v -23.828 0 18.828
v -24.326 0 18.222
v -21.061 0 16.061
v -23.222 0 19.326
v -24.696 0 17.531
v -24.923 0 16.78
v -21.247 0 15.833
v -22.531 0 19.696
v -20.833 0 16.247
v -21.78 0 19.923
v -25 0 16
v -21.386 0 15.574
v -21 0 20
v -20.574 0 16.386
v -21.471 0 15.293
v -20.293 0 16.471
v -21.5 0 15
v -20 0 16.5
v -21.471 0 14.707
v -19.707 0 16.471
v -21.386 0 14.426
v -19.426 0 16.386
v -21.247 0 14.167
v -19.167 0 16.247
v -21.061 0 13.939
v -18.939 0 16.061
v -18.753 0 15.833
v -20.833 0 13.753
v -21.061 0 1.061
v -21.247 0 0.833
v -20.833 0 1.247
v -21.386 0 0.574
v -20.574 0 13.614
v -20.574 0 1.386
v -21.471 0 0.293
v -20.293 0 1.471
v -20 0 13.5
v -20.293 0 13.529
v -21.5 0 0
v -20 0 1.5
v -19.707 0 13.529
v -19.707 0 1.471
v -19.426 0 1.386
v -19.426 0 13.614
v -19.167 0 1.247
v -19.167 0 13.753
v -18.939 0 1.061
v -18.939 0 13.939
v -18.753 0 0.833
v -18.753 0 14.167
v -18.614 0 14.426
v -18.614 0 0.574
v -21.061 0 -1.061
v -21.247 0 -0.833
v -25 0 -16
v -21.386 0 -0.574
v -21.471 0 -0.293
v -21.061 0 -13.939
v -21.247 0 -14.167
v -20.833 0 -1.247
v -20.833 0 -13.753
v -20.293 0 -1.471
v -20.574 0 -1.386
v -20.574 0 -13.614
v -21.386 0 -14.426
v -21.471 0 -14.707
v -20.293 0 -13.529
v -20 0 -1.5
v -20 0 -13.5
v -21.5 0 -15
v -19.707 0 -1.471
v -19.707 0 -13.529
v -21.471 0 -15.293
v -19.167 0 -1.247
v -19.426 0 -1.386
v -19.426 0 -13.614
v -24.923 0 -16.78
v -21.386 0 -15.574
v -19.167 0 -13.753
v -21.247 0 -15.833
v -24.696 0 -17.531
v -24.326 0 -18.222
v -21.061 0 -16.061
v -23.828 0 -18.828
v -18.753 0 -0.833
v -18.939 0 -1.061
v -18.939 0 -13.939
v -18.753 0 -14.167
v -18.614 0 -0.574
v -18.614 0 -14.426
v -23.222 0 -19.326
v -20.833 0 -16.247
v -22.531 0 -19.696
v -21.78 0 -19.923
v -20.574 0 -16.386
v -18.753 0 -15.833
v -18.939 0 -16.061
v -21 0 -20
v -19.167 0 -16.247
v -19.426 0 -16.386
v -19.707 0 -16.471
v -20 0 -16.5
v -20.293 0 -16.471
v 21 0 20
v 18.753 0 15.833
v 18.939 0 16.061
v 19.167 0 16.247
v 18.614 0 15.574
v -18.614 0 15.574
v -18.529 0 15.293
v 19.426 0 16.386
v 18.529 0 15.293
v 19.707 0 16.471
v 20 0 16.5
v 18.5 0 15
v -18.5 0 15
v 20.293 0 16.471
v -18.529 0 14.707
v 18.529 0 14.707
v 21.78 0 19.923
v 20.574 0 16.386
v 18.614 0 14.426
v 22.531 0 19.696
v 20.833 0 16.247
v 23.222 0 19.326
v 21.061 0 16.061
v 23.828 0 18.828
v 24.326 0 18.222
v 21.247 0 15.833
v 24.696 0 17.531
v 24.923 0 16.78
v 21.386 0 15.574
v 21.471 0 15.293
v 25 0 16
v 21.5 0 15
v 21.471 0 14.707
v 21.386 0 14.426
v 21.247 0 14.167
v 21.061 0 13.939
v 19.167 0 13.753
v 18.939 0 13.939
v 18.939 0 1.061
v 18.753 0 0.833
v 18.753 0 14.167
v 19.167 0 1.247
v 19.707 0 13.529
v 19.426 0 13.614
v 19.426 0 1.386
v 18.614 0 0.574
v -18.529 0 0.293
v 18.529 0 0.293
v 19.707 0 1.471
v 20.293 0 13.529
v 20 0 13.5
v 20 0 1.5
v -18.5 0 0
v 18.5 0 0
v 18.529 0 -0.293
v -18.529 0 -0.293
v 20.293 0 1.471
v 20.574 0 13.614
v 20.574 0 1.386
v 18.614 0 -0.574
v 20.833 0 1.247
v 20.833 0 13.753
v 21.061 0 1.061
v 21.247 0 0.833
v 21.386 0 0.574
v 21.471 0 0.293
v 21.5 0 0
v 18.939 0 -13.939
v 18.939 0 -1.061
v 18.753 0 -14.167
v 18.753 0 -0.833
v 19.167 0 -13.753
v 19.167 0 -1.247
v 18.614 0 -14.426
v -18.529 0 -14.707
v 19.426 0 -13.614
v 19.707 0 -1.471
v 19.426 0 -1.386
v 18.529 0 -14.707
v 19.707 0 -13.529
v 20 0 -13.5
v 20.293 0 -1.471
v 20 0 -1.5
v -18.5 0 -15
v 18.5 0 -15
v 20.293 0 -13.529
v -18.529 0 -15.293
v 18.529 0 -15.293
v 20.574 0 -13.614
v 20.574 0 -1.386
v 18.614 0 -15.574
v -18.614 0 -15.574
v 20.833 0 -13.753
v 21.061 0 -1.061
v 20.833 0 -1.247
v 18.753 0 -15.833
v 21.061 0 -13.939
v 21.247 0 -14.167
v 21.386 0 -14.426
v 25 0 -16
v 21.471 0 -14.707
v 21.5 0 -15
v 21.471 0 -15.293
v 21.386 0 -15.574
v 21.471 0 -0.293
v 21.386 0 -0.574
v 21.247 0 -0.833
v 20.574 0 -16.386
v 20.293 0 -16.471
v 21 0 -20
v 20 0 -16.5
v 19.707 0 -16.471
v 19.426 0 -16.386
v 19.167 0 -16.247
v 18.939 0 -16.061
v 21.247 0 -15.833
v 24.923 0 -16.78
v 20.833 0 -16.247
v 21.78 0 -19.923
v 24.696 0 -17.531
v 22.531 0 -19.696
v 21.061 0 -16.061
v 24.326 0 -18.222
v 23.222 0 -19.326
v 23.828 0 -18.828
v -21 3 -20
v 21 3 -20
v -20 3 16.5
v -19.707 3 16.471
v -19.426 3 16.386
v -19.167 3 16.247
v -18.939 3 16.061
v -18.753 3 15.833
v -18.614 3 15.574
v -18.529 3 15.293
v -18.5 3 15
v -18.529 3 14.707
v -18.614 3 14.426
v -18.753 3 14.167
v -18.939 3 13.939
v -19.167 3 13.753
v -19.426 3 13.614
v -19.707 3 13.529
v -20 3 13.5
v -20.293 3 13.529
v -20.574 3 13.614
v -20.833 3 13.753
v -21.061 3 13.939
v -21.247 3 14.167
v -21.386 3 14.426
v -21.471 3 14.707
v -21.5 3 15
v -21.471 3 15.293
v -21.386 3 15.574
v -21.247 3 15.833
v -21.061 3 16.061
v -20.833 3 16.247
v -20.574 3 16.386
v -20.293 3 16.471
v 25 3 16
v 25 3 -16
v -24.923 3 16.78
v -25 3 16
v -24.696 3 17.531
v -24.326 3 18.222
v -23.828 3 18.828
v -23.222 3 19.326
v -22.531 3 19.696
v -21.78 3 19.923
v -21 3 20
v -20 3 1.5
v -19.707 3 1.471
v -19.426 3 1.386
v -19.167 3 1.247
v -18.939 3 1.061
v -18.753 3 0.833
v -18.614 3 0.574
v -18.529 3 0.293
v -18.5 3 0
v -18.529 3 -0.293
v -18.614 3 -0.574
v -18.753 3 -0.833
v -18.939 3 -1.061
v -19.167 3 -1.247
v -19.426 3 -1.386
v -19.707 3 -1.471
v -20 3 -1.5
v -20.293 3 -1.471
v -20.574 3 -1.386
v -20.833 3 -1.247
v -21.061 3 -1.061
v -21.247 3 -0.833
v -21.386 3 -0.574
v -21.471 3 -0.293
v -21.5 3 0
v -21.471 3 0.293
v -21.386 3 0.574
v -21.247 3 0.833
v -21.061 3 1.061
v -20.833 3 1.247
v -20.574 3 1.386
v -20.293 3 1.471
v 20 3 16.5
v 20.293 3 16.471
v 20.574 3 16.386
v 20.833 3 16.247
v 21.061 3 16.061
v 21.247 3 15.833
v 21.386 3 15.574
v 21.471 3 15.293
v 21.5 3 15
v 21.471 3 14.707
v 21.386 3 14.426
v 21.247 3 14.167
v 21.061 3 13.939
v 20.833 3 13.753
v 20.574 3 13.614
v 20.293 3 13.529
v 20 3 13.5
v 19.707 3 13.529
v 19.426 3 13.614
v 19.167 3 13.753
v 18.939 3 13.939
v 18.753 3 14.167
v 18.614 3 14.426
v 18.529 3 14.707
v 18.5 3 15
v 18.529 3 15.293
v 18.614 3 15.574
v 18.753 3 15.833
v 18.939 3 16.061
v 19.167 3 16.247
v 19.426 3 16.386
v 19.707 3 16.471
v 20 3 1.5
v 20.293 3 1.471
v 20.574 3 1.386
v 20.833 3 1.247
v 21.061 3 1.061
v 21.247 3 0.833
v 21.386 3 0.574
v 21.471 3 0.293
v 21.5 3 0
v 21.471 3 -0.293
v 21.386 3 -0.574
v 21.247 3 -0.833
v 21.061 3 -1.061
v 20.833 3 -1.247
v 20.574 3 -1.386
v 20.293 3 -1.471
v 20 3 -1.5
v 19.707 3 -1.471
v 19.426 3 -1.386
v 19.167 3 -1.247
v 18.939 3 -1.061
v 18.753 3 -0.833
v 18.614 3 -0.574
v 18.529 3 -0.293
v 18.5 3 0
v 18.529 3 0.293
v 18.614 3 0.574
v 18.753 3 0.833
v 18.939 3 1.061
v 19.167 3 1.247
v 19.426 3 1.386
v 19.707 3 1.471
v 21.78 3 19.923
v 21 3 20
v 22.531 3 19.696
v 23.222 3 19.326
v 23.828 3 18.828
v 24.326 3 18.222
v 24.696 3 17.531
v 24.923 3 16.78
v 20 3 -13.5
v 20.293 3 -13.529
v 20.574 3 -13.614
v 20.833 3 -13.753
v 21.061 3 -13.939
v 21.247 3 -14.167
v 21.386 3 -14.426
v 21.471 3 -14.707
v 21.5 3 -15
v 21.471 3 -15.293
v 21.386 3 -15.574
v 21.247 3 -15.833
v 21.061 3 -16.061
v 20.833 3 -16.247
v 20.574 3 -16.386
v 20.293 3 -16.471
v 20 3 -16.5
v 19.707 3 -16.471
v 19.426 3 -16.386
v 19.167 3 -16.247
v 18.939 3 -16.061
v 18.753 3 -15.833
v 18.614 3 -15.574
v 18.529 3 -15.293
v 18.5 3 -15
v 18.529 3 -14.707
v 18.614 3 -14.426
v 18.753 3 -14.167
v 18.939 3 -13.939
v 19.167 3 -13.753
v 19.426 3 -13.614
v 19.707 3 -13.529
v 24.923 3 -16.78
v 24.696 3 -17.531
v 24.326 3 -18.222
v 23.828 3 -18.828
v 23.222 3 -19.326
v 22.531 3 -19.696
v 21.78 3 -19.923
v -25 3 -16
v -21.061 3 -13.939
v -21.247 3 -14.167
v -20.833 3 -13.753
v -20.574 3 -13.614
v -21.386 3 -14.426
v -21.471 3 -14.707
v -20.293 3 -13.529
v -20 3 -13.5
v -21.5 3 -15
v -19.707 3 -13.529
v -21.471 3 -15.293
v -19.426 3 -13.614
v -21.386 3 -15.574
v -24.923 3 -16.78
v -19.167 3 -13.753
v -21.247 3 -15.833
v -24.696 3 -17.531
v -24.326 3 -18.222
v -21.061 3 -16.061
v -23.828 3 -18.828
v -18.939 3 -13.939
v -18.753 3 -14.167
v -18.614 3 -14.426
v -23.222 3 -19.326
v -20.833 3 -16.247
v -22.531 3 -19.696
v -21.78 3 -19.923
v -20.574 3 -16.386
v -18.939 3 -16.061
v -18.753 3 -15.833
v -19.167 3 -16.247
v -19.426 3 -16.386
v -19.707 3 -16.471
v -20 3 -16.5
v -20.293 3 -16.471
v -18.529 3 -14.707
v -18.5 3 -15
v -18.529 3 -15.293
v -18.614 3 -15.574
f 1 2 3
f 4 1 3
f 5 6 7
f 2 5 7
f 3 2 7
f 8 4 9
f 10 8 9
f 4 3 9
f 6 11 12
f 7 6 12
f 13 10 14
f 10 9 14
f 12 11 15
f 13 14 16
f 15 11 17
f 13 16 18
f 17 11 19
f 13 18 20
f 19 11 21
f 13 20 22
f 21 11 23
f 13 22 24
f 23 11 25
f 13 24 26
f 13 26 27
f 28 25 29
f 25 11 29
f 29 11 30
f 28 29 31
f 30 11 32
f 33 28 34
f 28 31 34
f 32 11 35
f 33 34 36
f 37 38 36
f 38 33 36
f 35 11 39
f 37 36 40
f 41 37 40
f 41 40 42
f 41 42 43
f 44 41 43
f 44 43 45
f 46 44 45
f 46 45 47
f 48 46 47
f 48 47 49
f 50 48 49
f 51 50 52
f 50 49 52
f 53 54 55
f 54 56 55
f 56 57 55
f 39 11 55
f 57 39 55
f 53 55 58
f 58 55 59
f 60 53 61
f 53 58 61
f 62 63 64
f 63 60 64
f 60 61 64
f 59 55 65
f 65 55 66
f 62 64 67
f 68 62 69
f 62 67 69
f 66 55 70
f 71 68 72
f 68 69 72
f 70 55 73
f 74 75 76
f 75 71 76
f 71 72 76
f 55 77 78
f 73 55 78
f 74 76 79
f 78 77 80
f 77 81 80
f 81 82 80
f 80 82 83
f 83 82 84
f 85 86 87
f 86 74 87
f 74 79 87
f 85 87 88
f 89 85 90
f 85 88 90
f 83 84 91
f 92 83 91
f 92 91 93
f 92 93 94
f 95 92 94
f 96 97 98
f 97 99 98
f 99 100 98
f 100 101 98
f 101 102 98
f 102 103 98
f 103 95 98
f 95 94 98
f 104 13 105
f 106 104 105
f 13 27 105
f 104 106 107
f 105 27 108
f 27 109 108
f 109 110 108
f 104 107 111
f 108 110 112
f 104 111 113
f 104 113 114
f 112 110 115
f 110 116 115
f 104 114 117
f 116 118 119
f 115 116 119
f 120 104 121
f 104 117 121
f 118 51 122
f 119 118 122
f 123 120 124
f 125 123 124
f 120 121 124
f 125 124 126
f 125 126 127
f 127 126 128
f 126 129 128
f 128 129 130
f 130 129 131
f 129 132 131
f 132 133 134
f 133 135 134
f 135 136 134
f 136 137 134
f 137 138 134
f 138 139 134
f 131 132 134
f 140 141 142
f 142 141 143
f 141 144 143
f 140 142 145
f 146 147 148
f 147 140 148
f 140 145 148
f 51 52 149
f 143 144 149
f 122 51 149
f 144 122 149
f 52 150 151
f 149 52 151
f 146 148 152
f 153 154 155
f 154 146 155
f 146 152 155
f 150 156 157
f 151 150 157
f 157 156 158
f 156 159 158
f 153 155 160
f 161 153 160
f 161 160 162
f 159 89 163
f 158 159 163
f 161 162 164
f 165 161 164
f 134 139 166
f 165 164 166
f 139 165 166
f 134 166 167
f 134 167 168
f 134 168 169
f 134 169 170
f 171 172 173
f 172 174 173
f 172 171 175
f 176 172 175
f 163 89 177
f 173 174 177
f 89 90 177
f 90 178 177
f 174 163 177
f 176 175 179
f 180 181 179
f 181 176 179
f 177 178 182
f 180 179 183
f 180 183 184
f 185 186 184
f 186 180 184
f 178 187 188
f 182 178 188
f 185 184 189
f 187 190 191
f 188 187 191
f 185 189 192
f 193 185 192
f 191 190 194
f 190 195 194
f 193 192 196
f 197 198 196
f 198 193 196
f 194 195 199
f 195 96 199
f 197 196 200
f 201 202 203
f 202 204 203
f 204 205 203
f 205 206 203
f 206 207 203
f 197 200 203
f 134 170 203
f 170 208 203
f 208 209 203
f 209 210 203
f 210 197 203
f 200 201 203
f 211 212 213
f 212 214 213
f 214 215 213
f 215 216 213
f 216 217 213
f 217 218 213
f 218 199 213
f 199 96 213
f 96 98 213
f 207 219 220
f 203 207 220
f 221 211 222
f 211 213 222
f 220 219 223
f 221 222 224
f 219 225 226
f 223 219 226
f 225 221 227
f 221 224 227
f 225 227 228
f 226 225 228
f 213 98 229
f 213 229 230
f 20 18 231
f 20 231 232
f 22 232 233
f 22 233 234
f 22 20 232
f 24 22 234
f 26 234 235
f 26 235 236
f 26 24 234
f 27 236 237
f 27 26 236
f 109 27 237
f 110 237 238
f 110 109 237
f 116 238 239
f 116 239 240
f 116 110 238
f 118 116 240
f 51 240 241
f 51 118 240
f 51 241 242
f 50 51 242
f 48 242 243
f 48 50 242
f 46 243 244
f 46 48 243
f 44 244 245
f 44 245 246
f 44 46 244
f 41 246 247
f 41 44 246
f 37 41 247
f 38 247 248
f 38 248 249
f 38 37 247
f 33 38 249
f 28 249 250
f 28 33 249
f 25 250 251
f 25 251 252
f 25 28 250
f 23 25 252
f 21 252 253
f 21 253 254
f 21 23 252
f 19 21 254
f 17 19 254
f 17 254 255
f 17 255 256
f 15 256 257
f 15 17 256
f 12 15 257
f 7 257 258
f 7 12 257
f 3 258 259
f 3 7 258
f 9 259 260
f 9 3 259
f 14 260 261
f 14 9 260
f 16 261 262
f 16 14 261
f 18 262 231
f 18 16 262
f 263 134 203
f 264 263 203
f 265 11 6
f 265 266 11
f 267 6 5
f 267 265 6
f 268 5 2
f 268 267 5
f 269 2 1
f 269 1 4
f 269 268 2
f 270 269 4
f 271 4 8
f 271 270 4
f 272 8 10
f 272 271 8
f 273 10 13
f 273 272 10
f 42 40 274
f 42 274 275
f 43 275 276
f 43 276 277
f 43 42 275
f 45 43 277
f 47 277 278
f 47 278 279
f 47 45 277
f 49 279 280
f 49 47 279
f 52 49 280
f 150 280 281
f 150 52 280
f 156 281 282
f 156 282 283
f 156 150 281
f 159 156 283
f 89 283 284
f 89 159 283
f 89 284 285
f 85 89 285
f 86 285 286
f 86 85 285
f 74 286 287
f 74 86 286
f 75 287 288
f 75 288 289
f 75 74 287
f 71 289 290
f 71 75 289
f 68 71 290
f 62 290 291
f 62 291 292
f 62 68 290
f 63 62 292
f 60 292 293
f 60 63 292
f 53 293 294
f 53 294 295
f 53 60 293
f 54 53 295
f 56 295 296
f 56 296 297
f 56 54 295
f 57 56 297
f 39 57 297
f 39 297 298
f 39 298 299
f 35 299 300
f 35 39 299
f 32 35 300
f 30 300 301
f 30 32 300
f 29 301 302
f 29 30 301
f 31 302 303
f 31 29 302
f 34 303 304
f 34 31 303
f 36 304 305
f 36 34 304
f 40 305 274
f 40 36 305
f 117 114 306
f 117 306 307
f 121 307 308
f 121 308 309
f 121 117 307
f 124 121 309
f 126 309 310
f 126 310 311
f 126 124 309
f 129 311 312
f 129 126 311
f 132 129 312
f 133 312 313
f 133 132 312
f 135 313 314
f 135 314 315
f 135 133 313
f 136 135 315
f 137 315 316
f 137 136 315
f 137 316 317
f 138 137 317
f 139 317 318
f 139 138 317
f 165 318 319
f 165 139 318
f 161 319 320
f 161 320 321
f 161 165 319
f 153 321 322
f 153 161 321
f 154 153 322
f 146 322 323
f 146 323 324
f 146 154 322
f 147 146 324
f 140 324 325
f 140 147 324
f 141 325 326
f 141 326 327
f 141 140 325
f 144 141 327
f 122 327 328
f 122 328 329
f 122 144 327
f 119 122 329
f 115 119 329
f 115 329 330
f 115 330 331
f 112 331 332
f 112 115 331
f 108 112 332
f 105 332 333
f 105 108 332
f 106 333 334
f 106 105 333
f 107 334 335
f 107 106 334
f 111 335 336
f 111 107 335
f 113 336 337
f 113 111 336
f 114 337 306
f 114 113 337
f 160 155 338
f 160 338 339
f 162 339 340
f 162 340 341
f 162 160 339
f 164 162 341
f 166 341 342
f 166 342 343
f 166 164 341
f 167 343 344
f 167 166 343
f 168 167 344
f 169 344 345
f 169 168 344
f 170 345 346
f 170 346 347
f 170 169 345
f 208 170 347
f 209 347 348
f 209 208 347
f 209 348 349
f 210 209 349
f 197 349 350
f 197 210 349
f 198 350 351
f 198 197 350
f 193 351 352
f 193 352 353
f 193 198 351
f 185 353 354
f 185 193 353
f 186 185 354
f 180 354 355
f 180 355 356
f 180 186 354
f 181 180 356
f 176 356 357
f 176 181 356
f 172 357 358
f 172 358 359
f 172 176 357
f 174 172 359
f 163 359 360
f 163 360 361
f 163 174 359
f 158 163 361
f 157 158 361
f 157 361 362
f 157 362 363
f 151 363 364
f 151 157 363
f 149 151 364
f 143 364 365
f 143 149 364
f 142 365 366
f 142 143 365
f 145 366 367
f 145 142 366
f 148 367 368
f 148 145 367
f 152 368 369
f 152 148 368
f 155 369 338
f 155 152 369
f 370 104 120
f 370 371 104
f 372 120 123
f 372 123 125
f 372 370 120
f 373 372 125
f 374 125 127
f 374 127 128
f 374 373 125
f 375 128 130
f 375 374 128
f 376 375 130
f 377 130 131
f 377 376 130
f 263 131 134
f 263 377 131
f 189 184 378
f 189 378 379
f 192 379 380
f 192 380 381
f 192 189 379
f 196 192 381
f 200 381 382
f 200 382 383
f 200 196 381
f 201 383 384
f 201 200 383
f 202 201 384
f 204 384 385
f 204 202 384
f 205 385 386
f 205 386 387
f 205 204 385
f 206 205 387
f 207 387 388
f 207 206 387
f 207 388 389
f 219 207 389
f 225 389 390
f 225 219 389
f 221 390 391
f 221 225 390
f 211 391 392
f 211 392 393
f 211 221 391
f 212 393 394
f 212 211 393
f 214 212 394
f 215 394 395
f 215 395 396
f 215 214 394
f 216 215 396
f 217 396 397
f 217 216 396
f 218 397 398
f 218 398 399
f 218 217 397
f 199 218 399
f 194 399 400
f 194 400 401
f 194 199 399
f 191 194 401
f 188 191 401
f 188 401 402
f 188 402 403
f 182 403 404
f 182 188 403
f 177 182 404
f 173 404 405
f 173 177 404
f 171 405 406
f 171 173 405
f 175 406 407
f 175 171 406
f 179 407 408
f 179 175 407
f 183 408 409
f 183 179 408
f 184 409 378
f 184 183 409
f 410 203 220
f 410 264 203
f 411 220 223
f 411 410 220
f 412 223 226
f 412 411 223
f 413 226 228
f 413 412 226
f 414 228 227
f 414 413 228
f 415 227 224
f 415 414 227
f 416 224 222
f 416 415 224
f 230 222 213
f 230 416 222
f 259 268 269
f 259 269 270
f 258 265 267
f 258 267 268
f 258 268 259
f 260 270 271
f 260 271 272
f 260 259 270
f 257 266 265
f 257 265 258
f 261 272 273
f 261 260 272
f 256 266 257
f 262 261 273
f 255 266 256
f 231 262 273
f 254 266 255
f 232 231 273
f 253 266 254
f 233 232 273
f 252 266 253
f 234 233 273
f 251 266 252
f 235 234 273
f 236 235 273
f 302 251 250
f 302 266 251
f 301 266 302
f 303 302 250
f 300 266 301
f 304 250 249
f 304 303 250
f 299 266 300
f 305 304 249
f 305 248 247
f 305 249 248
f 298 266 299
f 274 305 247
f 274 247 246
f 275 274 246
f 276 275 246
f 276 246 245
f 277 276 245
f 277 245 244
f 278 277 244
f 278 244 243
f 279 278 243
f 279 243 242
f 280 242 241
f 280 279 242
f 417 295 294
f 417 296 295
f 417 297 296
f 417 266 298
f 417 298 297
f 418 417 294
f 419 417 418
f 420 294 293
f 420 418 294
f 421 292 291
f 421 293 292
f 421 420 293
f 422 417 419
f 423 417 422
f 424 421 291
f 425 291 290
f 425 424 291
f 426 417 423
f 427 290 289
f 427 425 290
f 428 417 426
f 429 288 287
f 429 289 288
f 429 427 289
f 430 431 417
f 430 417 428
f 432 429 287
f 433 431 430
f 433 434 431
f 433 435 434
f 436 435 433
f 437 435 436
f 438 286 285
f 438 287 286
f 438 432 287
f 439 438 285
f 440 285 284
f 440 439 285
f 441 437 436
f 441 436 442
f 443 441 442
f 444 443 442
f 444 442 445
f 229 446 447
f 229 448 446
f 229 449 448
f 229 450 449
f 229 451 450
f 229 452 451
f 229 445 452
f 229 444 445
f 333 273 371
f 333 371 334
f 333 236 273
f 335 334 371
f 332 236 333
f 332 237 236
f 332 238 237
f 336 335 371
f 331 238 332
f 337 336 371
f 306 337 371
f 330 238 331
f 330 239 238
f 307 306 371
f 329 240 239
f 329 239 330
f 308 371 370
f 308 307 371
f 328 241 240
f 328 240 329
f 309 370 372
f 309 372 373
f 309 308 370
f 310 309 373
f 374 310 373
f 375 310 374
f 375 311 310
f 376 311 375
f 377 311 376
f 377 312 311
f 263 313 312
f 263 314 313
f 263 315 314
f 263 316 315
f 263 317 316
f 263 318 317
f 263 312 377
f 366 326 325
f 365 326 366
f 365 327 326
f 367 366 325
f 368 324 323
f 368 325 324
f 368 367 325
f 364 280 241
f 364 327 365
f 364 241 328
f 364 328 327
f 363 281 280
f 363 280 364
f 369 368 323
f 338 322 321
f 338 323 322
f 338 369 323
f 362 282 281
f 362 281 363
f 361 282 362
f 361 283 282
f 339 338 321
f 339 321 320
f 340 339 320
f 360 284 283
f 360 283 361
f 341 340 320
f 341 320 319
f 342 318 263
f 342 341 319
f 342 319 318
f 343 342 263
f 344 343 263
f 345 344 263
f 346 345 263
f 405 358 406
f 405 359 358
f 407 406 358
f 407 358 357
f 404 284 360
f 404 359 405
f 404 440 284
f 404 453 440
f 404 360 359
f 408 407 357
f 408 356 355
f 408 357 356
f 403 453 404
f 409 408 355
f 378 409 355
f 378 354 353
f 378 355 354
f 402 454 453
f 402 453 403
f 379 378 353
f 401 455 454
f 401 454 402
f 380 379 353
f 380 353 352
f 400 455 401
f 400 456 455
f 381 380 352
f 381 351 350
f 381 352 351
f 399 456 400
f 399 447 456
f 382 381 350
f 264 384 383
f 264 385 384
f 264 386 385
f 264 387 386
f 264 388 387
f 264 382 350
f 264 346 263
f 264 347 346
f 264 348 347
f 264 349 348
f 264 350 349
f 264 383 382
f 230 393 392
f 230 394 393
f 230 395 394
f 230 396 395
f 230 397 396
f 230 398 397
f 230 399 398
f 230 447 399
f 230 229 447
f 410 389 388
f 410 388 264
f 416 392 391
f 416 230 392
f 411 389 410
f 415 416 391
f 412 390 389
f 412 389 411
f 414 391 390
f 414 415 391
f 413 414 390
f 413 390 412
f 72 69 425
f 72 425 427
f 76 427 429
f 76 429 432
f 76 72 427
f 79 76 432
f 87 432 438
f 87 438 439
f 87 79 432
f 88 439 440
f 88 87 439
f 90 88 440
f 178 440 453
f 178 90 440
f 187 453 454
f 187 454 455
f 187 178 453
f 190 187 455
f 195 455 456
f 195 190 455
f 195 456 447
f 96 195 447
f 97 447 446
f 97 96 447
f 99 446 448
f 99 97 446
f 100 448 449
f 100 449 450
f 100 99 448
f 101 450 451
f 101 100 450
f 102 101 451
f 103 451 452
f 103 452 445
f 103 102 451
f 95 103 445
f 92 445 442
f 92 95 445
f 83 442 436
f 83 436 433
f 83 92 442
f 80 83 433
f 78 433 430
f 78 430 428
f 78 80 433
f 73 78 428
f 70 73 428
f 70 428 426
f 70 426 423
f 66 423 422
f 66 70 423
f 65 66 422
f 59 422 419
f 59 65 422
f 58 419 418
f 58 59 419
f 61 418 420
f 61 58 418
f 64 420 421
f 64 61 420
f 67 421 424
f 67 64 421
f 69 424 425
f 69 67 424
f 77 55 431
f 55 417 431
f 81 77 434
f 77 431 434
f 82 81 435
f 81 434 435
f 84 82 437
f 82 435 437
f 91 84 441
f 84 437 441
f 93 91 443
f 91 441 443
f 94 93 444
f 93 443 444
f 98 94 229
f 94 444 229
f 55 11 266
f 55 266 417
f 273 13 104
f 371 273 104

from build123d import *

# Parameters (mm, degrees)
SKETCH1_W           = 50
SKETCH1_H           = 40
BOSS_EXTRUDE1_DEPTH = 3
FILLET1_R           = 4
SKETCH2_R           = 1.5
CUT_EXTRUDE1_DEPTH  = 3
SKETCH3_R           = 1.5
CUT_EXTRUDE3_DEPTH  = 3


with BuildPart() as part:
    # Sketch1 → Boss-Extrude1 (new body)
    with BuildSketch(Plane(origin=(0, 0, 0), x_dir=(1, 0, 0), z_dir=(0, 1, 0))):
        Rectangle(SKETCH1_W, SKETCH1_H)
    extrude(amount=BOSS_EXTRUDE1_DEPTH)

    # Fillet1
    fillet1_edges = [part.edges().sort_by_distance(p)[0] for p in [
        (25, 1.5, 20),
        (-25, 1.5, 20),
        (-25, 1.5, -20),
        (25, 1.5, -20),
    ]]
    fillet(fillet1_edges, radius=FILLET1_R)

    # Sketch2 → Cut-Extrude1 (cut)
    with BuildSketch(Plane(origin=(0, 0, 0), x_dir=(1, 0, 0), z_dir=(0, 1, 0))):
        with Locations(Location((-20, 0, 0), (0, 0, 270))):
            Circle(SKETCH2_R)
        with Locations(Location((20, 0, 0), (0, 0, 270))):
            Circle(SKETCH2_R)
    extrude(amount=CUT_EXTRUDE1_DEPTH, mode=Mode.SUBTRACT)

    # Sketch3 → Cut-Extrude3 (cut)
    with BuildSketch(Plane(origin=(0, 0, 0), x_dir=(1, 0, 0), z_dir=(0, 1, 0))):
        with Locations(Location((-20, -15, 0), (0, 0, 270))):
            Circle(SKETCH3_R)
        with Locations(Location((20, -15, 0), (0, 0, 270))):
            Circle(SKETCH3_R)
        with Locations(Location((20, 15, 0), (0, 0, 270))):
            Circle(SKETCH3_R)
        with Locations(Location((-20, 15, 0), (0, 0, 270))):
            Circle(SKETCH3_R)
    extrude(amount=CUT_EXTRUDE3_DEPTH, mode=Mode.SUBTRACT)


solid = part.part
